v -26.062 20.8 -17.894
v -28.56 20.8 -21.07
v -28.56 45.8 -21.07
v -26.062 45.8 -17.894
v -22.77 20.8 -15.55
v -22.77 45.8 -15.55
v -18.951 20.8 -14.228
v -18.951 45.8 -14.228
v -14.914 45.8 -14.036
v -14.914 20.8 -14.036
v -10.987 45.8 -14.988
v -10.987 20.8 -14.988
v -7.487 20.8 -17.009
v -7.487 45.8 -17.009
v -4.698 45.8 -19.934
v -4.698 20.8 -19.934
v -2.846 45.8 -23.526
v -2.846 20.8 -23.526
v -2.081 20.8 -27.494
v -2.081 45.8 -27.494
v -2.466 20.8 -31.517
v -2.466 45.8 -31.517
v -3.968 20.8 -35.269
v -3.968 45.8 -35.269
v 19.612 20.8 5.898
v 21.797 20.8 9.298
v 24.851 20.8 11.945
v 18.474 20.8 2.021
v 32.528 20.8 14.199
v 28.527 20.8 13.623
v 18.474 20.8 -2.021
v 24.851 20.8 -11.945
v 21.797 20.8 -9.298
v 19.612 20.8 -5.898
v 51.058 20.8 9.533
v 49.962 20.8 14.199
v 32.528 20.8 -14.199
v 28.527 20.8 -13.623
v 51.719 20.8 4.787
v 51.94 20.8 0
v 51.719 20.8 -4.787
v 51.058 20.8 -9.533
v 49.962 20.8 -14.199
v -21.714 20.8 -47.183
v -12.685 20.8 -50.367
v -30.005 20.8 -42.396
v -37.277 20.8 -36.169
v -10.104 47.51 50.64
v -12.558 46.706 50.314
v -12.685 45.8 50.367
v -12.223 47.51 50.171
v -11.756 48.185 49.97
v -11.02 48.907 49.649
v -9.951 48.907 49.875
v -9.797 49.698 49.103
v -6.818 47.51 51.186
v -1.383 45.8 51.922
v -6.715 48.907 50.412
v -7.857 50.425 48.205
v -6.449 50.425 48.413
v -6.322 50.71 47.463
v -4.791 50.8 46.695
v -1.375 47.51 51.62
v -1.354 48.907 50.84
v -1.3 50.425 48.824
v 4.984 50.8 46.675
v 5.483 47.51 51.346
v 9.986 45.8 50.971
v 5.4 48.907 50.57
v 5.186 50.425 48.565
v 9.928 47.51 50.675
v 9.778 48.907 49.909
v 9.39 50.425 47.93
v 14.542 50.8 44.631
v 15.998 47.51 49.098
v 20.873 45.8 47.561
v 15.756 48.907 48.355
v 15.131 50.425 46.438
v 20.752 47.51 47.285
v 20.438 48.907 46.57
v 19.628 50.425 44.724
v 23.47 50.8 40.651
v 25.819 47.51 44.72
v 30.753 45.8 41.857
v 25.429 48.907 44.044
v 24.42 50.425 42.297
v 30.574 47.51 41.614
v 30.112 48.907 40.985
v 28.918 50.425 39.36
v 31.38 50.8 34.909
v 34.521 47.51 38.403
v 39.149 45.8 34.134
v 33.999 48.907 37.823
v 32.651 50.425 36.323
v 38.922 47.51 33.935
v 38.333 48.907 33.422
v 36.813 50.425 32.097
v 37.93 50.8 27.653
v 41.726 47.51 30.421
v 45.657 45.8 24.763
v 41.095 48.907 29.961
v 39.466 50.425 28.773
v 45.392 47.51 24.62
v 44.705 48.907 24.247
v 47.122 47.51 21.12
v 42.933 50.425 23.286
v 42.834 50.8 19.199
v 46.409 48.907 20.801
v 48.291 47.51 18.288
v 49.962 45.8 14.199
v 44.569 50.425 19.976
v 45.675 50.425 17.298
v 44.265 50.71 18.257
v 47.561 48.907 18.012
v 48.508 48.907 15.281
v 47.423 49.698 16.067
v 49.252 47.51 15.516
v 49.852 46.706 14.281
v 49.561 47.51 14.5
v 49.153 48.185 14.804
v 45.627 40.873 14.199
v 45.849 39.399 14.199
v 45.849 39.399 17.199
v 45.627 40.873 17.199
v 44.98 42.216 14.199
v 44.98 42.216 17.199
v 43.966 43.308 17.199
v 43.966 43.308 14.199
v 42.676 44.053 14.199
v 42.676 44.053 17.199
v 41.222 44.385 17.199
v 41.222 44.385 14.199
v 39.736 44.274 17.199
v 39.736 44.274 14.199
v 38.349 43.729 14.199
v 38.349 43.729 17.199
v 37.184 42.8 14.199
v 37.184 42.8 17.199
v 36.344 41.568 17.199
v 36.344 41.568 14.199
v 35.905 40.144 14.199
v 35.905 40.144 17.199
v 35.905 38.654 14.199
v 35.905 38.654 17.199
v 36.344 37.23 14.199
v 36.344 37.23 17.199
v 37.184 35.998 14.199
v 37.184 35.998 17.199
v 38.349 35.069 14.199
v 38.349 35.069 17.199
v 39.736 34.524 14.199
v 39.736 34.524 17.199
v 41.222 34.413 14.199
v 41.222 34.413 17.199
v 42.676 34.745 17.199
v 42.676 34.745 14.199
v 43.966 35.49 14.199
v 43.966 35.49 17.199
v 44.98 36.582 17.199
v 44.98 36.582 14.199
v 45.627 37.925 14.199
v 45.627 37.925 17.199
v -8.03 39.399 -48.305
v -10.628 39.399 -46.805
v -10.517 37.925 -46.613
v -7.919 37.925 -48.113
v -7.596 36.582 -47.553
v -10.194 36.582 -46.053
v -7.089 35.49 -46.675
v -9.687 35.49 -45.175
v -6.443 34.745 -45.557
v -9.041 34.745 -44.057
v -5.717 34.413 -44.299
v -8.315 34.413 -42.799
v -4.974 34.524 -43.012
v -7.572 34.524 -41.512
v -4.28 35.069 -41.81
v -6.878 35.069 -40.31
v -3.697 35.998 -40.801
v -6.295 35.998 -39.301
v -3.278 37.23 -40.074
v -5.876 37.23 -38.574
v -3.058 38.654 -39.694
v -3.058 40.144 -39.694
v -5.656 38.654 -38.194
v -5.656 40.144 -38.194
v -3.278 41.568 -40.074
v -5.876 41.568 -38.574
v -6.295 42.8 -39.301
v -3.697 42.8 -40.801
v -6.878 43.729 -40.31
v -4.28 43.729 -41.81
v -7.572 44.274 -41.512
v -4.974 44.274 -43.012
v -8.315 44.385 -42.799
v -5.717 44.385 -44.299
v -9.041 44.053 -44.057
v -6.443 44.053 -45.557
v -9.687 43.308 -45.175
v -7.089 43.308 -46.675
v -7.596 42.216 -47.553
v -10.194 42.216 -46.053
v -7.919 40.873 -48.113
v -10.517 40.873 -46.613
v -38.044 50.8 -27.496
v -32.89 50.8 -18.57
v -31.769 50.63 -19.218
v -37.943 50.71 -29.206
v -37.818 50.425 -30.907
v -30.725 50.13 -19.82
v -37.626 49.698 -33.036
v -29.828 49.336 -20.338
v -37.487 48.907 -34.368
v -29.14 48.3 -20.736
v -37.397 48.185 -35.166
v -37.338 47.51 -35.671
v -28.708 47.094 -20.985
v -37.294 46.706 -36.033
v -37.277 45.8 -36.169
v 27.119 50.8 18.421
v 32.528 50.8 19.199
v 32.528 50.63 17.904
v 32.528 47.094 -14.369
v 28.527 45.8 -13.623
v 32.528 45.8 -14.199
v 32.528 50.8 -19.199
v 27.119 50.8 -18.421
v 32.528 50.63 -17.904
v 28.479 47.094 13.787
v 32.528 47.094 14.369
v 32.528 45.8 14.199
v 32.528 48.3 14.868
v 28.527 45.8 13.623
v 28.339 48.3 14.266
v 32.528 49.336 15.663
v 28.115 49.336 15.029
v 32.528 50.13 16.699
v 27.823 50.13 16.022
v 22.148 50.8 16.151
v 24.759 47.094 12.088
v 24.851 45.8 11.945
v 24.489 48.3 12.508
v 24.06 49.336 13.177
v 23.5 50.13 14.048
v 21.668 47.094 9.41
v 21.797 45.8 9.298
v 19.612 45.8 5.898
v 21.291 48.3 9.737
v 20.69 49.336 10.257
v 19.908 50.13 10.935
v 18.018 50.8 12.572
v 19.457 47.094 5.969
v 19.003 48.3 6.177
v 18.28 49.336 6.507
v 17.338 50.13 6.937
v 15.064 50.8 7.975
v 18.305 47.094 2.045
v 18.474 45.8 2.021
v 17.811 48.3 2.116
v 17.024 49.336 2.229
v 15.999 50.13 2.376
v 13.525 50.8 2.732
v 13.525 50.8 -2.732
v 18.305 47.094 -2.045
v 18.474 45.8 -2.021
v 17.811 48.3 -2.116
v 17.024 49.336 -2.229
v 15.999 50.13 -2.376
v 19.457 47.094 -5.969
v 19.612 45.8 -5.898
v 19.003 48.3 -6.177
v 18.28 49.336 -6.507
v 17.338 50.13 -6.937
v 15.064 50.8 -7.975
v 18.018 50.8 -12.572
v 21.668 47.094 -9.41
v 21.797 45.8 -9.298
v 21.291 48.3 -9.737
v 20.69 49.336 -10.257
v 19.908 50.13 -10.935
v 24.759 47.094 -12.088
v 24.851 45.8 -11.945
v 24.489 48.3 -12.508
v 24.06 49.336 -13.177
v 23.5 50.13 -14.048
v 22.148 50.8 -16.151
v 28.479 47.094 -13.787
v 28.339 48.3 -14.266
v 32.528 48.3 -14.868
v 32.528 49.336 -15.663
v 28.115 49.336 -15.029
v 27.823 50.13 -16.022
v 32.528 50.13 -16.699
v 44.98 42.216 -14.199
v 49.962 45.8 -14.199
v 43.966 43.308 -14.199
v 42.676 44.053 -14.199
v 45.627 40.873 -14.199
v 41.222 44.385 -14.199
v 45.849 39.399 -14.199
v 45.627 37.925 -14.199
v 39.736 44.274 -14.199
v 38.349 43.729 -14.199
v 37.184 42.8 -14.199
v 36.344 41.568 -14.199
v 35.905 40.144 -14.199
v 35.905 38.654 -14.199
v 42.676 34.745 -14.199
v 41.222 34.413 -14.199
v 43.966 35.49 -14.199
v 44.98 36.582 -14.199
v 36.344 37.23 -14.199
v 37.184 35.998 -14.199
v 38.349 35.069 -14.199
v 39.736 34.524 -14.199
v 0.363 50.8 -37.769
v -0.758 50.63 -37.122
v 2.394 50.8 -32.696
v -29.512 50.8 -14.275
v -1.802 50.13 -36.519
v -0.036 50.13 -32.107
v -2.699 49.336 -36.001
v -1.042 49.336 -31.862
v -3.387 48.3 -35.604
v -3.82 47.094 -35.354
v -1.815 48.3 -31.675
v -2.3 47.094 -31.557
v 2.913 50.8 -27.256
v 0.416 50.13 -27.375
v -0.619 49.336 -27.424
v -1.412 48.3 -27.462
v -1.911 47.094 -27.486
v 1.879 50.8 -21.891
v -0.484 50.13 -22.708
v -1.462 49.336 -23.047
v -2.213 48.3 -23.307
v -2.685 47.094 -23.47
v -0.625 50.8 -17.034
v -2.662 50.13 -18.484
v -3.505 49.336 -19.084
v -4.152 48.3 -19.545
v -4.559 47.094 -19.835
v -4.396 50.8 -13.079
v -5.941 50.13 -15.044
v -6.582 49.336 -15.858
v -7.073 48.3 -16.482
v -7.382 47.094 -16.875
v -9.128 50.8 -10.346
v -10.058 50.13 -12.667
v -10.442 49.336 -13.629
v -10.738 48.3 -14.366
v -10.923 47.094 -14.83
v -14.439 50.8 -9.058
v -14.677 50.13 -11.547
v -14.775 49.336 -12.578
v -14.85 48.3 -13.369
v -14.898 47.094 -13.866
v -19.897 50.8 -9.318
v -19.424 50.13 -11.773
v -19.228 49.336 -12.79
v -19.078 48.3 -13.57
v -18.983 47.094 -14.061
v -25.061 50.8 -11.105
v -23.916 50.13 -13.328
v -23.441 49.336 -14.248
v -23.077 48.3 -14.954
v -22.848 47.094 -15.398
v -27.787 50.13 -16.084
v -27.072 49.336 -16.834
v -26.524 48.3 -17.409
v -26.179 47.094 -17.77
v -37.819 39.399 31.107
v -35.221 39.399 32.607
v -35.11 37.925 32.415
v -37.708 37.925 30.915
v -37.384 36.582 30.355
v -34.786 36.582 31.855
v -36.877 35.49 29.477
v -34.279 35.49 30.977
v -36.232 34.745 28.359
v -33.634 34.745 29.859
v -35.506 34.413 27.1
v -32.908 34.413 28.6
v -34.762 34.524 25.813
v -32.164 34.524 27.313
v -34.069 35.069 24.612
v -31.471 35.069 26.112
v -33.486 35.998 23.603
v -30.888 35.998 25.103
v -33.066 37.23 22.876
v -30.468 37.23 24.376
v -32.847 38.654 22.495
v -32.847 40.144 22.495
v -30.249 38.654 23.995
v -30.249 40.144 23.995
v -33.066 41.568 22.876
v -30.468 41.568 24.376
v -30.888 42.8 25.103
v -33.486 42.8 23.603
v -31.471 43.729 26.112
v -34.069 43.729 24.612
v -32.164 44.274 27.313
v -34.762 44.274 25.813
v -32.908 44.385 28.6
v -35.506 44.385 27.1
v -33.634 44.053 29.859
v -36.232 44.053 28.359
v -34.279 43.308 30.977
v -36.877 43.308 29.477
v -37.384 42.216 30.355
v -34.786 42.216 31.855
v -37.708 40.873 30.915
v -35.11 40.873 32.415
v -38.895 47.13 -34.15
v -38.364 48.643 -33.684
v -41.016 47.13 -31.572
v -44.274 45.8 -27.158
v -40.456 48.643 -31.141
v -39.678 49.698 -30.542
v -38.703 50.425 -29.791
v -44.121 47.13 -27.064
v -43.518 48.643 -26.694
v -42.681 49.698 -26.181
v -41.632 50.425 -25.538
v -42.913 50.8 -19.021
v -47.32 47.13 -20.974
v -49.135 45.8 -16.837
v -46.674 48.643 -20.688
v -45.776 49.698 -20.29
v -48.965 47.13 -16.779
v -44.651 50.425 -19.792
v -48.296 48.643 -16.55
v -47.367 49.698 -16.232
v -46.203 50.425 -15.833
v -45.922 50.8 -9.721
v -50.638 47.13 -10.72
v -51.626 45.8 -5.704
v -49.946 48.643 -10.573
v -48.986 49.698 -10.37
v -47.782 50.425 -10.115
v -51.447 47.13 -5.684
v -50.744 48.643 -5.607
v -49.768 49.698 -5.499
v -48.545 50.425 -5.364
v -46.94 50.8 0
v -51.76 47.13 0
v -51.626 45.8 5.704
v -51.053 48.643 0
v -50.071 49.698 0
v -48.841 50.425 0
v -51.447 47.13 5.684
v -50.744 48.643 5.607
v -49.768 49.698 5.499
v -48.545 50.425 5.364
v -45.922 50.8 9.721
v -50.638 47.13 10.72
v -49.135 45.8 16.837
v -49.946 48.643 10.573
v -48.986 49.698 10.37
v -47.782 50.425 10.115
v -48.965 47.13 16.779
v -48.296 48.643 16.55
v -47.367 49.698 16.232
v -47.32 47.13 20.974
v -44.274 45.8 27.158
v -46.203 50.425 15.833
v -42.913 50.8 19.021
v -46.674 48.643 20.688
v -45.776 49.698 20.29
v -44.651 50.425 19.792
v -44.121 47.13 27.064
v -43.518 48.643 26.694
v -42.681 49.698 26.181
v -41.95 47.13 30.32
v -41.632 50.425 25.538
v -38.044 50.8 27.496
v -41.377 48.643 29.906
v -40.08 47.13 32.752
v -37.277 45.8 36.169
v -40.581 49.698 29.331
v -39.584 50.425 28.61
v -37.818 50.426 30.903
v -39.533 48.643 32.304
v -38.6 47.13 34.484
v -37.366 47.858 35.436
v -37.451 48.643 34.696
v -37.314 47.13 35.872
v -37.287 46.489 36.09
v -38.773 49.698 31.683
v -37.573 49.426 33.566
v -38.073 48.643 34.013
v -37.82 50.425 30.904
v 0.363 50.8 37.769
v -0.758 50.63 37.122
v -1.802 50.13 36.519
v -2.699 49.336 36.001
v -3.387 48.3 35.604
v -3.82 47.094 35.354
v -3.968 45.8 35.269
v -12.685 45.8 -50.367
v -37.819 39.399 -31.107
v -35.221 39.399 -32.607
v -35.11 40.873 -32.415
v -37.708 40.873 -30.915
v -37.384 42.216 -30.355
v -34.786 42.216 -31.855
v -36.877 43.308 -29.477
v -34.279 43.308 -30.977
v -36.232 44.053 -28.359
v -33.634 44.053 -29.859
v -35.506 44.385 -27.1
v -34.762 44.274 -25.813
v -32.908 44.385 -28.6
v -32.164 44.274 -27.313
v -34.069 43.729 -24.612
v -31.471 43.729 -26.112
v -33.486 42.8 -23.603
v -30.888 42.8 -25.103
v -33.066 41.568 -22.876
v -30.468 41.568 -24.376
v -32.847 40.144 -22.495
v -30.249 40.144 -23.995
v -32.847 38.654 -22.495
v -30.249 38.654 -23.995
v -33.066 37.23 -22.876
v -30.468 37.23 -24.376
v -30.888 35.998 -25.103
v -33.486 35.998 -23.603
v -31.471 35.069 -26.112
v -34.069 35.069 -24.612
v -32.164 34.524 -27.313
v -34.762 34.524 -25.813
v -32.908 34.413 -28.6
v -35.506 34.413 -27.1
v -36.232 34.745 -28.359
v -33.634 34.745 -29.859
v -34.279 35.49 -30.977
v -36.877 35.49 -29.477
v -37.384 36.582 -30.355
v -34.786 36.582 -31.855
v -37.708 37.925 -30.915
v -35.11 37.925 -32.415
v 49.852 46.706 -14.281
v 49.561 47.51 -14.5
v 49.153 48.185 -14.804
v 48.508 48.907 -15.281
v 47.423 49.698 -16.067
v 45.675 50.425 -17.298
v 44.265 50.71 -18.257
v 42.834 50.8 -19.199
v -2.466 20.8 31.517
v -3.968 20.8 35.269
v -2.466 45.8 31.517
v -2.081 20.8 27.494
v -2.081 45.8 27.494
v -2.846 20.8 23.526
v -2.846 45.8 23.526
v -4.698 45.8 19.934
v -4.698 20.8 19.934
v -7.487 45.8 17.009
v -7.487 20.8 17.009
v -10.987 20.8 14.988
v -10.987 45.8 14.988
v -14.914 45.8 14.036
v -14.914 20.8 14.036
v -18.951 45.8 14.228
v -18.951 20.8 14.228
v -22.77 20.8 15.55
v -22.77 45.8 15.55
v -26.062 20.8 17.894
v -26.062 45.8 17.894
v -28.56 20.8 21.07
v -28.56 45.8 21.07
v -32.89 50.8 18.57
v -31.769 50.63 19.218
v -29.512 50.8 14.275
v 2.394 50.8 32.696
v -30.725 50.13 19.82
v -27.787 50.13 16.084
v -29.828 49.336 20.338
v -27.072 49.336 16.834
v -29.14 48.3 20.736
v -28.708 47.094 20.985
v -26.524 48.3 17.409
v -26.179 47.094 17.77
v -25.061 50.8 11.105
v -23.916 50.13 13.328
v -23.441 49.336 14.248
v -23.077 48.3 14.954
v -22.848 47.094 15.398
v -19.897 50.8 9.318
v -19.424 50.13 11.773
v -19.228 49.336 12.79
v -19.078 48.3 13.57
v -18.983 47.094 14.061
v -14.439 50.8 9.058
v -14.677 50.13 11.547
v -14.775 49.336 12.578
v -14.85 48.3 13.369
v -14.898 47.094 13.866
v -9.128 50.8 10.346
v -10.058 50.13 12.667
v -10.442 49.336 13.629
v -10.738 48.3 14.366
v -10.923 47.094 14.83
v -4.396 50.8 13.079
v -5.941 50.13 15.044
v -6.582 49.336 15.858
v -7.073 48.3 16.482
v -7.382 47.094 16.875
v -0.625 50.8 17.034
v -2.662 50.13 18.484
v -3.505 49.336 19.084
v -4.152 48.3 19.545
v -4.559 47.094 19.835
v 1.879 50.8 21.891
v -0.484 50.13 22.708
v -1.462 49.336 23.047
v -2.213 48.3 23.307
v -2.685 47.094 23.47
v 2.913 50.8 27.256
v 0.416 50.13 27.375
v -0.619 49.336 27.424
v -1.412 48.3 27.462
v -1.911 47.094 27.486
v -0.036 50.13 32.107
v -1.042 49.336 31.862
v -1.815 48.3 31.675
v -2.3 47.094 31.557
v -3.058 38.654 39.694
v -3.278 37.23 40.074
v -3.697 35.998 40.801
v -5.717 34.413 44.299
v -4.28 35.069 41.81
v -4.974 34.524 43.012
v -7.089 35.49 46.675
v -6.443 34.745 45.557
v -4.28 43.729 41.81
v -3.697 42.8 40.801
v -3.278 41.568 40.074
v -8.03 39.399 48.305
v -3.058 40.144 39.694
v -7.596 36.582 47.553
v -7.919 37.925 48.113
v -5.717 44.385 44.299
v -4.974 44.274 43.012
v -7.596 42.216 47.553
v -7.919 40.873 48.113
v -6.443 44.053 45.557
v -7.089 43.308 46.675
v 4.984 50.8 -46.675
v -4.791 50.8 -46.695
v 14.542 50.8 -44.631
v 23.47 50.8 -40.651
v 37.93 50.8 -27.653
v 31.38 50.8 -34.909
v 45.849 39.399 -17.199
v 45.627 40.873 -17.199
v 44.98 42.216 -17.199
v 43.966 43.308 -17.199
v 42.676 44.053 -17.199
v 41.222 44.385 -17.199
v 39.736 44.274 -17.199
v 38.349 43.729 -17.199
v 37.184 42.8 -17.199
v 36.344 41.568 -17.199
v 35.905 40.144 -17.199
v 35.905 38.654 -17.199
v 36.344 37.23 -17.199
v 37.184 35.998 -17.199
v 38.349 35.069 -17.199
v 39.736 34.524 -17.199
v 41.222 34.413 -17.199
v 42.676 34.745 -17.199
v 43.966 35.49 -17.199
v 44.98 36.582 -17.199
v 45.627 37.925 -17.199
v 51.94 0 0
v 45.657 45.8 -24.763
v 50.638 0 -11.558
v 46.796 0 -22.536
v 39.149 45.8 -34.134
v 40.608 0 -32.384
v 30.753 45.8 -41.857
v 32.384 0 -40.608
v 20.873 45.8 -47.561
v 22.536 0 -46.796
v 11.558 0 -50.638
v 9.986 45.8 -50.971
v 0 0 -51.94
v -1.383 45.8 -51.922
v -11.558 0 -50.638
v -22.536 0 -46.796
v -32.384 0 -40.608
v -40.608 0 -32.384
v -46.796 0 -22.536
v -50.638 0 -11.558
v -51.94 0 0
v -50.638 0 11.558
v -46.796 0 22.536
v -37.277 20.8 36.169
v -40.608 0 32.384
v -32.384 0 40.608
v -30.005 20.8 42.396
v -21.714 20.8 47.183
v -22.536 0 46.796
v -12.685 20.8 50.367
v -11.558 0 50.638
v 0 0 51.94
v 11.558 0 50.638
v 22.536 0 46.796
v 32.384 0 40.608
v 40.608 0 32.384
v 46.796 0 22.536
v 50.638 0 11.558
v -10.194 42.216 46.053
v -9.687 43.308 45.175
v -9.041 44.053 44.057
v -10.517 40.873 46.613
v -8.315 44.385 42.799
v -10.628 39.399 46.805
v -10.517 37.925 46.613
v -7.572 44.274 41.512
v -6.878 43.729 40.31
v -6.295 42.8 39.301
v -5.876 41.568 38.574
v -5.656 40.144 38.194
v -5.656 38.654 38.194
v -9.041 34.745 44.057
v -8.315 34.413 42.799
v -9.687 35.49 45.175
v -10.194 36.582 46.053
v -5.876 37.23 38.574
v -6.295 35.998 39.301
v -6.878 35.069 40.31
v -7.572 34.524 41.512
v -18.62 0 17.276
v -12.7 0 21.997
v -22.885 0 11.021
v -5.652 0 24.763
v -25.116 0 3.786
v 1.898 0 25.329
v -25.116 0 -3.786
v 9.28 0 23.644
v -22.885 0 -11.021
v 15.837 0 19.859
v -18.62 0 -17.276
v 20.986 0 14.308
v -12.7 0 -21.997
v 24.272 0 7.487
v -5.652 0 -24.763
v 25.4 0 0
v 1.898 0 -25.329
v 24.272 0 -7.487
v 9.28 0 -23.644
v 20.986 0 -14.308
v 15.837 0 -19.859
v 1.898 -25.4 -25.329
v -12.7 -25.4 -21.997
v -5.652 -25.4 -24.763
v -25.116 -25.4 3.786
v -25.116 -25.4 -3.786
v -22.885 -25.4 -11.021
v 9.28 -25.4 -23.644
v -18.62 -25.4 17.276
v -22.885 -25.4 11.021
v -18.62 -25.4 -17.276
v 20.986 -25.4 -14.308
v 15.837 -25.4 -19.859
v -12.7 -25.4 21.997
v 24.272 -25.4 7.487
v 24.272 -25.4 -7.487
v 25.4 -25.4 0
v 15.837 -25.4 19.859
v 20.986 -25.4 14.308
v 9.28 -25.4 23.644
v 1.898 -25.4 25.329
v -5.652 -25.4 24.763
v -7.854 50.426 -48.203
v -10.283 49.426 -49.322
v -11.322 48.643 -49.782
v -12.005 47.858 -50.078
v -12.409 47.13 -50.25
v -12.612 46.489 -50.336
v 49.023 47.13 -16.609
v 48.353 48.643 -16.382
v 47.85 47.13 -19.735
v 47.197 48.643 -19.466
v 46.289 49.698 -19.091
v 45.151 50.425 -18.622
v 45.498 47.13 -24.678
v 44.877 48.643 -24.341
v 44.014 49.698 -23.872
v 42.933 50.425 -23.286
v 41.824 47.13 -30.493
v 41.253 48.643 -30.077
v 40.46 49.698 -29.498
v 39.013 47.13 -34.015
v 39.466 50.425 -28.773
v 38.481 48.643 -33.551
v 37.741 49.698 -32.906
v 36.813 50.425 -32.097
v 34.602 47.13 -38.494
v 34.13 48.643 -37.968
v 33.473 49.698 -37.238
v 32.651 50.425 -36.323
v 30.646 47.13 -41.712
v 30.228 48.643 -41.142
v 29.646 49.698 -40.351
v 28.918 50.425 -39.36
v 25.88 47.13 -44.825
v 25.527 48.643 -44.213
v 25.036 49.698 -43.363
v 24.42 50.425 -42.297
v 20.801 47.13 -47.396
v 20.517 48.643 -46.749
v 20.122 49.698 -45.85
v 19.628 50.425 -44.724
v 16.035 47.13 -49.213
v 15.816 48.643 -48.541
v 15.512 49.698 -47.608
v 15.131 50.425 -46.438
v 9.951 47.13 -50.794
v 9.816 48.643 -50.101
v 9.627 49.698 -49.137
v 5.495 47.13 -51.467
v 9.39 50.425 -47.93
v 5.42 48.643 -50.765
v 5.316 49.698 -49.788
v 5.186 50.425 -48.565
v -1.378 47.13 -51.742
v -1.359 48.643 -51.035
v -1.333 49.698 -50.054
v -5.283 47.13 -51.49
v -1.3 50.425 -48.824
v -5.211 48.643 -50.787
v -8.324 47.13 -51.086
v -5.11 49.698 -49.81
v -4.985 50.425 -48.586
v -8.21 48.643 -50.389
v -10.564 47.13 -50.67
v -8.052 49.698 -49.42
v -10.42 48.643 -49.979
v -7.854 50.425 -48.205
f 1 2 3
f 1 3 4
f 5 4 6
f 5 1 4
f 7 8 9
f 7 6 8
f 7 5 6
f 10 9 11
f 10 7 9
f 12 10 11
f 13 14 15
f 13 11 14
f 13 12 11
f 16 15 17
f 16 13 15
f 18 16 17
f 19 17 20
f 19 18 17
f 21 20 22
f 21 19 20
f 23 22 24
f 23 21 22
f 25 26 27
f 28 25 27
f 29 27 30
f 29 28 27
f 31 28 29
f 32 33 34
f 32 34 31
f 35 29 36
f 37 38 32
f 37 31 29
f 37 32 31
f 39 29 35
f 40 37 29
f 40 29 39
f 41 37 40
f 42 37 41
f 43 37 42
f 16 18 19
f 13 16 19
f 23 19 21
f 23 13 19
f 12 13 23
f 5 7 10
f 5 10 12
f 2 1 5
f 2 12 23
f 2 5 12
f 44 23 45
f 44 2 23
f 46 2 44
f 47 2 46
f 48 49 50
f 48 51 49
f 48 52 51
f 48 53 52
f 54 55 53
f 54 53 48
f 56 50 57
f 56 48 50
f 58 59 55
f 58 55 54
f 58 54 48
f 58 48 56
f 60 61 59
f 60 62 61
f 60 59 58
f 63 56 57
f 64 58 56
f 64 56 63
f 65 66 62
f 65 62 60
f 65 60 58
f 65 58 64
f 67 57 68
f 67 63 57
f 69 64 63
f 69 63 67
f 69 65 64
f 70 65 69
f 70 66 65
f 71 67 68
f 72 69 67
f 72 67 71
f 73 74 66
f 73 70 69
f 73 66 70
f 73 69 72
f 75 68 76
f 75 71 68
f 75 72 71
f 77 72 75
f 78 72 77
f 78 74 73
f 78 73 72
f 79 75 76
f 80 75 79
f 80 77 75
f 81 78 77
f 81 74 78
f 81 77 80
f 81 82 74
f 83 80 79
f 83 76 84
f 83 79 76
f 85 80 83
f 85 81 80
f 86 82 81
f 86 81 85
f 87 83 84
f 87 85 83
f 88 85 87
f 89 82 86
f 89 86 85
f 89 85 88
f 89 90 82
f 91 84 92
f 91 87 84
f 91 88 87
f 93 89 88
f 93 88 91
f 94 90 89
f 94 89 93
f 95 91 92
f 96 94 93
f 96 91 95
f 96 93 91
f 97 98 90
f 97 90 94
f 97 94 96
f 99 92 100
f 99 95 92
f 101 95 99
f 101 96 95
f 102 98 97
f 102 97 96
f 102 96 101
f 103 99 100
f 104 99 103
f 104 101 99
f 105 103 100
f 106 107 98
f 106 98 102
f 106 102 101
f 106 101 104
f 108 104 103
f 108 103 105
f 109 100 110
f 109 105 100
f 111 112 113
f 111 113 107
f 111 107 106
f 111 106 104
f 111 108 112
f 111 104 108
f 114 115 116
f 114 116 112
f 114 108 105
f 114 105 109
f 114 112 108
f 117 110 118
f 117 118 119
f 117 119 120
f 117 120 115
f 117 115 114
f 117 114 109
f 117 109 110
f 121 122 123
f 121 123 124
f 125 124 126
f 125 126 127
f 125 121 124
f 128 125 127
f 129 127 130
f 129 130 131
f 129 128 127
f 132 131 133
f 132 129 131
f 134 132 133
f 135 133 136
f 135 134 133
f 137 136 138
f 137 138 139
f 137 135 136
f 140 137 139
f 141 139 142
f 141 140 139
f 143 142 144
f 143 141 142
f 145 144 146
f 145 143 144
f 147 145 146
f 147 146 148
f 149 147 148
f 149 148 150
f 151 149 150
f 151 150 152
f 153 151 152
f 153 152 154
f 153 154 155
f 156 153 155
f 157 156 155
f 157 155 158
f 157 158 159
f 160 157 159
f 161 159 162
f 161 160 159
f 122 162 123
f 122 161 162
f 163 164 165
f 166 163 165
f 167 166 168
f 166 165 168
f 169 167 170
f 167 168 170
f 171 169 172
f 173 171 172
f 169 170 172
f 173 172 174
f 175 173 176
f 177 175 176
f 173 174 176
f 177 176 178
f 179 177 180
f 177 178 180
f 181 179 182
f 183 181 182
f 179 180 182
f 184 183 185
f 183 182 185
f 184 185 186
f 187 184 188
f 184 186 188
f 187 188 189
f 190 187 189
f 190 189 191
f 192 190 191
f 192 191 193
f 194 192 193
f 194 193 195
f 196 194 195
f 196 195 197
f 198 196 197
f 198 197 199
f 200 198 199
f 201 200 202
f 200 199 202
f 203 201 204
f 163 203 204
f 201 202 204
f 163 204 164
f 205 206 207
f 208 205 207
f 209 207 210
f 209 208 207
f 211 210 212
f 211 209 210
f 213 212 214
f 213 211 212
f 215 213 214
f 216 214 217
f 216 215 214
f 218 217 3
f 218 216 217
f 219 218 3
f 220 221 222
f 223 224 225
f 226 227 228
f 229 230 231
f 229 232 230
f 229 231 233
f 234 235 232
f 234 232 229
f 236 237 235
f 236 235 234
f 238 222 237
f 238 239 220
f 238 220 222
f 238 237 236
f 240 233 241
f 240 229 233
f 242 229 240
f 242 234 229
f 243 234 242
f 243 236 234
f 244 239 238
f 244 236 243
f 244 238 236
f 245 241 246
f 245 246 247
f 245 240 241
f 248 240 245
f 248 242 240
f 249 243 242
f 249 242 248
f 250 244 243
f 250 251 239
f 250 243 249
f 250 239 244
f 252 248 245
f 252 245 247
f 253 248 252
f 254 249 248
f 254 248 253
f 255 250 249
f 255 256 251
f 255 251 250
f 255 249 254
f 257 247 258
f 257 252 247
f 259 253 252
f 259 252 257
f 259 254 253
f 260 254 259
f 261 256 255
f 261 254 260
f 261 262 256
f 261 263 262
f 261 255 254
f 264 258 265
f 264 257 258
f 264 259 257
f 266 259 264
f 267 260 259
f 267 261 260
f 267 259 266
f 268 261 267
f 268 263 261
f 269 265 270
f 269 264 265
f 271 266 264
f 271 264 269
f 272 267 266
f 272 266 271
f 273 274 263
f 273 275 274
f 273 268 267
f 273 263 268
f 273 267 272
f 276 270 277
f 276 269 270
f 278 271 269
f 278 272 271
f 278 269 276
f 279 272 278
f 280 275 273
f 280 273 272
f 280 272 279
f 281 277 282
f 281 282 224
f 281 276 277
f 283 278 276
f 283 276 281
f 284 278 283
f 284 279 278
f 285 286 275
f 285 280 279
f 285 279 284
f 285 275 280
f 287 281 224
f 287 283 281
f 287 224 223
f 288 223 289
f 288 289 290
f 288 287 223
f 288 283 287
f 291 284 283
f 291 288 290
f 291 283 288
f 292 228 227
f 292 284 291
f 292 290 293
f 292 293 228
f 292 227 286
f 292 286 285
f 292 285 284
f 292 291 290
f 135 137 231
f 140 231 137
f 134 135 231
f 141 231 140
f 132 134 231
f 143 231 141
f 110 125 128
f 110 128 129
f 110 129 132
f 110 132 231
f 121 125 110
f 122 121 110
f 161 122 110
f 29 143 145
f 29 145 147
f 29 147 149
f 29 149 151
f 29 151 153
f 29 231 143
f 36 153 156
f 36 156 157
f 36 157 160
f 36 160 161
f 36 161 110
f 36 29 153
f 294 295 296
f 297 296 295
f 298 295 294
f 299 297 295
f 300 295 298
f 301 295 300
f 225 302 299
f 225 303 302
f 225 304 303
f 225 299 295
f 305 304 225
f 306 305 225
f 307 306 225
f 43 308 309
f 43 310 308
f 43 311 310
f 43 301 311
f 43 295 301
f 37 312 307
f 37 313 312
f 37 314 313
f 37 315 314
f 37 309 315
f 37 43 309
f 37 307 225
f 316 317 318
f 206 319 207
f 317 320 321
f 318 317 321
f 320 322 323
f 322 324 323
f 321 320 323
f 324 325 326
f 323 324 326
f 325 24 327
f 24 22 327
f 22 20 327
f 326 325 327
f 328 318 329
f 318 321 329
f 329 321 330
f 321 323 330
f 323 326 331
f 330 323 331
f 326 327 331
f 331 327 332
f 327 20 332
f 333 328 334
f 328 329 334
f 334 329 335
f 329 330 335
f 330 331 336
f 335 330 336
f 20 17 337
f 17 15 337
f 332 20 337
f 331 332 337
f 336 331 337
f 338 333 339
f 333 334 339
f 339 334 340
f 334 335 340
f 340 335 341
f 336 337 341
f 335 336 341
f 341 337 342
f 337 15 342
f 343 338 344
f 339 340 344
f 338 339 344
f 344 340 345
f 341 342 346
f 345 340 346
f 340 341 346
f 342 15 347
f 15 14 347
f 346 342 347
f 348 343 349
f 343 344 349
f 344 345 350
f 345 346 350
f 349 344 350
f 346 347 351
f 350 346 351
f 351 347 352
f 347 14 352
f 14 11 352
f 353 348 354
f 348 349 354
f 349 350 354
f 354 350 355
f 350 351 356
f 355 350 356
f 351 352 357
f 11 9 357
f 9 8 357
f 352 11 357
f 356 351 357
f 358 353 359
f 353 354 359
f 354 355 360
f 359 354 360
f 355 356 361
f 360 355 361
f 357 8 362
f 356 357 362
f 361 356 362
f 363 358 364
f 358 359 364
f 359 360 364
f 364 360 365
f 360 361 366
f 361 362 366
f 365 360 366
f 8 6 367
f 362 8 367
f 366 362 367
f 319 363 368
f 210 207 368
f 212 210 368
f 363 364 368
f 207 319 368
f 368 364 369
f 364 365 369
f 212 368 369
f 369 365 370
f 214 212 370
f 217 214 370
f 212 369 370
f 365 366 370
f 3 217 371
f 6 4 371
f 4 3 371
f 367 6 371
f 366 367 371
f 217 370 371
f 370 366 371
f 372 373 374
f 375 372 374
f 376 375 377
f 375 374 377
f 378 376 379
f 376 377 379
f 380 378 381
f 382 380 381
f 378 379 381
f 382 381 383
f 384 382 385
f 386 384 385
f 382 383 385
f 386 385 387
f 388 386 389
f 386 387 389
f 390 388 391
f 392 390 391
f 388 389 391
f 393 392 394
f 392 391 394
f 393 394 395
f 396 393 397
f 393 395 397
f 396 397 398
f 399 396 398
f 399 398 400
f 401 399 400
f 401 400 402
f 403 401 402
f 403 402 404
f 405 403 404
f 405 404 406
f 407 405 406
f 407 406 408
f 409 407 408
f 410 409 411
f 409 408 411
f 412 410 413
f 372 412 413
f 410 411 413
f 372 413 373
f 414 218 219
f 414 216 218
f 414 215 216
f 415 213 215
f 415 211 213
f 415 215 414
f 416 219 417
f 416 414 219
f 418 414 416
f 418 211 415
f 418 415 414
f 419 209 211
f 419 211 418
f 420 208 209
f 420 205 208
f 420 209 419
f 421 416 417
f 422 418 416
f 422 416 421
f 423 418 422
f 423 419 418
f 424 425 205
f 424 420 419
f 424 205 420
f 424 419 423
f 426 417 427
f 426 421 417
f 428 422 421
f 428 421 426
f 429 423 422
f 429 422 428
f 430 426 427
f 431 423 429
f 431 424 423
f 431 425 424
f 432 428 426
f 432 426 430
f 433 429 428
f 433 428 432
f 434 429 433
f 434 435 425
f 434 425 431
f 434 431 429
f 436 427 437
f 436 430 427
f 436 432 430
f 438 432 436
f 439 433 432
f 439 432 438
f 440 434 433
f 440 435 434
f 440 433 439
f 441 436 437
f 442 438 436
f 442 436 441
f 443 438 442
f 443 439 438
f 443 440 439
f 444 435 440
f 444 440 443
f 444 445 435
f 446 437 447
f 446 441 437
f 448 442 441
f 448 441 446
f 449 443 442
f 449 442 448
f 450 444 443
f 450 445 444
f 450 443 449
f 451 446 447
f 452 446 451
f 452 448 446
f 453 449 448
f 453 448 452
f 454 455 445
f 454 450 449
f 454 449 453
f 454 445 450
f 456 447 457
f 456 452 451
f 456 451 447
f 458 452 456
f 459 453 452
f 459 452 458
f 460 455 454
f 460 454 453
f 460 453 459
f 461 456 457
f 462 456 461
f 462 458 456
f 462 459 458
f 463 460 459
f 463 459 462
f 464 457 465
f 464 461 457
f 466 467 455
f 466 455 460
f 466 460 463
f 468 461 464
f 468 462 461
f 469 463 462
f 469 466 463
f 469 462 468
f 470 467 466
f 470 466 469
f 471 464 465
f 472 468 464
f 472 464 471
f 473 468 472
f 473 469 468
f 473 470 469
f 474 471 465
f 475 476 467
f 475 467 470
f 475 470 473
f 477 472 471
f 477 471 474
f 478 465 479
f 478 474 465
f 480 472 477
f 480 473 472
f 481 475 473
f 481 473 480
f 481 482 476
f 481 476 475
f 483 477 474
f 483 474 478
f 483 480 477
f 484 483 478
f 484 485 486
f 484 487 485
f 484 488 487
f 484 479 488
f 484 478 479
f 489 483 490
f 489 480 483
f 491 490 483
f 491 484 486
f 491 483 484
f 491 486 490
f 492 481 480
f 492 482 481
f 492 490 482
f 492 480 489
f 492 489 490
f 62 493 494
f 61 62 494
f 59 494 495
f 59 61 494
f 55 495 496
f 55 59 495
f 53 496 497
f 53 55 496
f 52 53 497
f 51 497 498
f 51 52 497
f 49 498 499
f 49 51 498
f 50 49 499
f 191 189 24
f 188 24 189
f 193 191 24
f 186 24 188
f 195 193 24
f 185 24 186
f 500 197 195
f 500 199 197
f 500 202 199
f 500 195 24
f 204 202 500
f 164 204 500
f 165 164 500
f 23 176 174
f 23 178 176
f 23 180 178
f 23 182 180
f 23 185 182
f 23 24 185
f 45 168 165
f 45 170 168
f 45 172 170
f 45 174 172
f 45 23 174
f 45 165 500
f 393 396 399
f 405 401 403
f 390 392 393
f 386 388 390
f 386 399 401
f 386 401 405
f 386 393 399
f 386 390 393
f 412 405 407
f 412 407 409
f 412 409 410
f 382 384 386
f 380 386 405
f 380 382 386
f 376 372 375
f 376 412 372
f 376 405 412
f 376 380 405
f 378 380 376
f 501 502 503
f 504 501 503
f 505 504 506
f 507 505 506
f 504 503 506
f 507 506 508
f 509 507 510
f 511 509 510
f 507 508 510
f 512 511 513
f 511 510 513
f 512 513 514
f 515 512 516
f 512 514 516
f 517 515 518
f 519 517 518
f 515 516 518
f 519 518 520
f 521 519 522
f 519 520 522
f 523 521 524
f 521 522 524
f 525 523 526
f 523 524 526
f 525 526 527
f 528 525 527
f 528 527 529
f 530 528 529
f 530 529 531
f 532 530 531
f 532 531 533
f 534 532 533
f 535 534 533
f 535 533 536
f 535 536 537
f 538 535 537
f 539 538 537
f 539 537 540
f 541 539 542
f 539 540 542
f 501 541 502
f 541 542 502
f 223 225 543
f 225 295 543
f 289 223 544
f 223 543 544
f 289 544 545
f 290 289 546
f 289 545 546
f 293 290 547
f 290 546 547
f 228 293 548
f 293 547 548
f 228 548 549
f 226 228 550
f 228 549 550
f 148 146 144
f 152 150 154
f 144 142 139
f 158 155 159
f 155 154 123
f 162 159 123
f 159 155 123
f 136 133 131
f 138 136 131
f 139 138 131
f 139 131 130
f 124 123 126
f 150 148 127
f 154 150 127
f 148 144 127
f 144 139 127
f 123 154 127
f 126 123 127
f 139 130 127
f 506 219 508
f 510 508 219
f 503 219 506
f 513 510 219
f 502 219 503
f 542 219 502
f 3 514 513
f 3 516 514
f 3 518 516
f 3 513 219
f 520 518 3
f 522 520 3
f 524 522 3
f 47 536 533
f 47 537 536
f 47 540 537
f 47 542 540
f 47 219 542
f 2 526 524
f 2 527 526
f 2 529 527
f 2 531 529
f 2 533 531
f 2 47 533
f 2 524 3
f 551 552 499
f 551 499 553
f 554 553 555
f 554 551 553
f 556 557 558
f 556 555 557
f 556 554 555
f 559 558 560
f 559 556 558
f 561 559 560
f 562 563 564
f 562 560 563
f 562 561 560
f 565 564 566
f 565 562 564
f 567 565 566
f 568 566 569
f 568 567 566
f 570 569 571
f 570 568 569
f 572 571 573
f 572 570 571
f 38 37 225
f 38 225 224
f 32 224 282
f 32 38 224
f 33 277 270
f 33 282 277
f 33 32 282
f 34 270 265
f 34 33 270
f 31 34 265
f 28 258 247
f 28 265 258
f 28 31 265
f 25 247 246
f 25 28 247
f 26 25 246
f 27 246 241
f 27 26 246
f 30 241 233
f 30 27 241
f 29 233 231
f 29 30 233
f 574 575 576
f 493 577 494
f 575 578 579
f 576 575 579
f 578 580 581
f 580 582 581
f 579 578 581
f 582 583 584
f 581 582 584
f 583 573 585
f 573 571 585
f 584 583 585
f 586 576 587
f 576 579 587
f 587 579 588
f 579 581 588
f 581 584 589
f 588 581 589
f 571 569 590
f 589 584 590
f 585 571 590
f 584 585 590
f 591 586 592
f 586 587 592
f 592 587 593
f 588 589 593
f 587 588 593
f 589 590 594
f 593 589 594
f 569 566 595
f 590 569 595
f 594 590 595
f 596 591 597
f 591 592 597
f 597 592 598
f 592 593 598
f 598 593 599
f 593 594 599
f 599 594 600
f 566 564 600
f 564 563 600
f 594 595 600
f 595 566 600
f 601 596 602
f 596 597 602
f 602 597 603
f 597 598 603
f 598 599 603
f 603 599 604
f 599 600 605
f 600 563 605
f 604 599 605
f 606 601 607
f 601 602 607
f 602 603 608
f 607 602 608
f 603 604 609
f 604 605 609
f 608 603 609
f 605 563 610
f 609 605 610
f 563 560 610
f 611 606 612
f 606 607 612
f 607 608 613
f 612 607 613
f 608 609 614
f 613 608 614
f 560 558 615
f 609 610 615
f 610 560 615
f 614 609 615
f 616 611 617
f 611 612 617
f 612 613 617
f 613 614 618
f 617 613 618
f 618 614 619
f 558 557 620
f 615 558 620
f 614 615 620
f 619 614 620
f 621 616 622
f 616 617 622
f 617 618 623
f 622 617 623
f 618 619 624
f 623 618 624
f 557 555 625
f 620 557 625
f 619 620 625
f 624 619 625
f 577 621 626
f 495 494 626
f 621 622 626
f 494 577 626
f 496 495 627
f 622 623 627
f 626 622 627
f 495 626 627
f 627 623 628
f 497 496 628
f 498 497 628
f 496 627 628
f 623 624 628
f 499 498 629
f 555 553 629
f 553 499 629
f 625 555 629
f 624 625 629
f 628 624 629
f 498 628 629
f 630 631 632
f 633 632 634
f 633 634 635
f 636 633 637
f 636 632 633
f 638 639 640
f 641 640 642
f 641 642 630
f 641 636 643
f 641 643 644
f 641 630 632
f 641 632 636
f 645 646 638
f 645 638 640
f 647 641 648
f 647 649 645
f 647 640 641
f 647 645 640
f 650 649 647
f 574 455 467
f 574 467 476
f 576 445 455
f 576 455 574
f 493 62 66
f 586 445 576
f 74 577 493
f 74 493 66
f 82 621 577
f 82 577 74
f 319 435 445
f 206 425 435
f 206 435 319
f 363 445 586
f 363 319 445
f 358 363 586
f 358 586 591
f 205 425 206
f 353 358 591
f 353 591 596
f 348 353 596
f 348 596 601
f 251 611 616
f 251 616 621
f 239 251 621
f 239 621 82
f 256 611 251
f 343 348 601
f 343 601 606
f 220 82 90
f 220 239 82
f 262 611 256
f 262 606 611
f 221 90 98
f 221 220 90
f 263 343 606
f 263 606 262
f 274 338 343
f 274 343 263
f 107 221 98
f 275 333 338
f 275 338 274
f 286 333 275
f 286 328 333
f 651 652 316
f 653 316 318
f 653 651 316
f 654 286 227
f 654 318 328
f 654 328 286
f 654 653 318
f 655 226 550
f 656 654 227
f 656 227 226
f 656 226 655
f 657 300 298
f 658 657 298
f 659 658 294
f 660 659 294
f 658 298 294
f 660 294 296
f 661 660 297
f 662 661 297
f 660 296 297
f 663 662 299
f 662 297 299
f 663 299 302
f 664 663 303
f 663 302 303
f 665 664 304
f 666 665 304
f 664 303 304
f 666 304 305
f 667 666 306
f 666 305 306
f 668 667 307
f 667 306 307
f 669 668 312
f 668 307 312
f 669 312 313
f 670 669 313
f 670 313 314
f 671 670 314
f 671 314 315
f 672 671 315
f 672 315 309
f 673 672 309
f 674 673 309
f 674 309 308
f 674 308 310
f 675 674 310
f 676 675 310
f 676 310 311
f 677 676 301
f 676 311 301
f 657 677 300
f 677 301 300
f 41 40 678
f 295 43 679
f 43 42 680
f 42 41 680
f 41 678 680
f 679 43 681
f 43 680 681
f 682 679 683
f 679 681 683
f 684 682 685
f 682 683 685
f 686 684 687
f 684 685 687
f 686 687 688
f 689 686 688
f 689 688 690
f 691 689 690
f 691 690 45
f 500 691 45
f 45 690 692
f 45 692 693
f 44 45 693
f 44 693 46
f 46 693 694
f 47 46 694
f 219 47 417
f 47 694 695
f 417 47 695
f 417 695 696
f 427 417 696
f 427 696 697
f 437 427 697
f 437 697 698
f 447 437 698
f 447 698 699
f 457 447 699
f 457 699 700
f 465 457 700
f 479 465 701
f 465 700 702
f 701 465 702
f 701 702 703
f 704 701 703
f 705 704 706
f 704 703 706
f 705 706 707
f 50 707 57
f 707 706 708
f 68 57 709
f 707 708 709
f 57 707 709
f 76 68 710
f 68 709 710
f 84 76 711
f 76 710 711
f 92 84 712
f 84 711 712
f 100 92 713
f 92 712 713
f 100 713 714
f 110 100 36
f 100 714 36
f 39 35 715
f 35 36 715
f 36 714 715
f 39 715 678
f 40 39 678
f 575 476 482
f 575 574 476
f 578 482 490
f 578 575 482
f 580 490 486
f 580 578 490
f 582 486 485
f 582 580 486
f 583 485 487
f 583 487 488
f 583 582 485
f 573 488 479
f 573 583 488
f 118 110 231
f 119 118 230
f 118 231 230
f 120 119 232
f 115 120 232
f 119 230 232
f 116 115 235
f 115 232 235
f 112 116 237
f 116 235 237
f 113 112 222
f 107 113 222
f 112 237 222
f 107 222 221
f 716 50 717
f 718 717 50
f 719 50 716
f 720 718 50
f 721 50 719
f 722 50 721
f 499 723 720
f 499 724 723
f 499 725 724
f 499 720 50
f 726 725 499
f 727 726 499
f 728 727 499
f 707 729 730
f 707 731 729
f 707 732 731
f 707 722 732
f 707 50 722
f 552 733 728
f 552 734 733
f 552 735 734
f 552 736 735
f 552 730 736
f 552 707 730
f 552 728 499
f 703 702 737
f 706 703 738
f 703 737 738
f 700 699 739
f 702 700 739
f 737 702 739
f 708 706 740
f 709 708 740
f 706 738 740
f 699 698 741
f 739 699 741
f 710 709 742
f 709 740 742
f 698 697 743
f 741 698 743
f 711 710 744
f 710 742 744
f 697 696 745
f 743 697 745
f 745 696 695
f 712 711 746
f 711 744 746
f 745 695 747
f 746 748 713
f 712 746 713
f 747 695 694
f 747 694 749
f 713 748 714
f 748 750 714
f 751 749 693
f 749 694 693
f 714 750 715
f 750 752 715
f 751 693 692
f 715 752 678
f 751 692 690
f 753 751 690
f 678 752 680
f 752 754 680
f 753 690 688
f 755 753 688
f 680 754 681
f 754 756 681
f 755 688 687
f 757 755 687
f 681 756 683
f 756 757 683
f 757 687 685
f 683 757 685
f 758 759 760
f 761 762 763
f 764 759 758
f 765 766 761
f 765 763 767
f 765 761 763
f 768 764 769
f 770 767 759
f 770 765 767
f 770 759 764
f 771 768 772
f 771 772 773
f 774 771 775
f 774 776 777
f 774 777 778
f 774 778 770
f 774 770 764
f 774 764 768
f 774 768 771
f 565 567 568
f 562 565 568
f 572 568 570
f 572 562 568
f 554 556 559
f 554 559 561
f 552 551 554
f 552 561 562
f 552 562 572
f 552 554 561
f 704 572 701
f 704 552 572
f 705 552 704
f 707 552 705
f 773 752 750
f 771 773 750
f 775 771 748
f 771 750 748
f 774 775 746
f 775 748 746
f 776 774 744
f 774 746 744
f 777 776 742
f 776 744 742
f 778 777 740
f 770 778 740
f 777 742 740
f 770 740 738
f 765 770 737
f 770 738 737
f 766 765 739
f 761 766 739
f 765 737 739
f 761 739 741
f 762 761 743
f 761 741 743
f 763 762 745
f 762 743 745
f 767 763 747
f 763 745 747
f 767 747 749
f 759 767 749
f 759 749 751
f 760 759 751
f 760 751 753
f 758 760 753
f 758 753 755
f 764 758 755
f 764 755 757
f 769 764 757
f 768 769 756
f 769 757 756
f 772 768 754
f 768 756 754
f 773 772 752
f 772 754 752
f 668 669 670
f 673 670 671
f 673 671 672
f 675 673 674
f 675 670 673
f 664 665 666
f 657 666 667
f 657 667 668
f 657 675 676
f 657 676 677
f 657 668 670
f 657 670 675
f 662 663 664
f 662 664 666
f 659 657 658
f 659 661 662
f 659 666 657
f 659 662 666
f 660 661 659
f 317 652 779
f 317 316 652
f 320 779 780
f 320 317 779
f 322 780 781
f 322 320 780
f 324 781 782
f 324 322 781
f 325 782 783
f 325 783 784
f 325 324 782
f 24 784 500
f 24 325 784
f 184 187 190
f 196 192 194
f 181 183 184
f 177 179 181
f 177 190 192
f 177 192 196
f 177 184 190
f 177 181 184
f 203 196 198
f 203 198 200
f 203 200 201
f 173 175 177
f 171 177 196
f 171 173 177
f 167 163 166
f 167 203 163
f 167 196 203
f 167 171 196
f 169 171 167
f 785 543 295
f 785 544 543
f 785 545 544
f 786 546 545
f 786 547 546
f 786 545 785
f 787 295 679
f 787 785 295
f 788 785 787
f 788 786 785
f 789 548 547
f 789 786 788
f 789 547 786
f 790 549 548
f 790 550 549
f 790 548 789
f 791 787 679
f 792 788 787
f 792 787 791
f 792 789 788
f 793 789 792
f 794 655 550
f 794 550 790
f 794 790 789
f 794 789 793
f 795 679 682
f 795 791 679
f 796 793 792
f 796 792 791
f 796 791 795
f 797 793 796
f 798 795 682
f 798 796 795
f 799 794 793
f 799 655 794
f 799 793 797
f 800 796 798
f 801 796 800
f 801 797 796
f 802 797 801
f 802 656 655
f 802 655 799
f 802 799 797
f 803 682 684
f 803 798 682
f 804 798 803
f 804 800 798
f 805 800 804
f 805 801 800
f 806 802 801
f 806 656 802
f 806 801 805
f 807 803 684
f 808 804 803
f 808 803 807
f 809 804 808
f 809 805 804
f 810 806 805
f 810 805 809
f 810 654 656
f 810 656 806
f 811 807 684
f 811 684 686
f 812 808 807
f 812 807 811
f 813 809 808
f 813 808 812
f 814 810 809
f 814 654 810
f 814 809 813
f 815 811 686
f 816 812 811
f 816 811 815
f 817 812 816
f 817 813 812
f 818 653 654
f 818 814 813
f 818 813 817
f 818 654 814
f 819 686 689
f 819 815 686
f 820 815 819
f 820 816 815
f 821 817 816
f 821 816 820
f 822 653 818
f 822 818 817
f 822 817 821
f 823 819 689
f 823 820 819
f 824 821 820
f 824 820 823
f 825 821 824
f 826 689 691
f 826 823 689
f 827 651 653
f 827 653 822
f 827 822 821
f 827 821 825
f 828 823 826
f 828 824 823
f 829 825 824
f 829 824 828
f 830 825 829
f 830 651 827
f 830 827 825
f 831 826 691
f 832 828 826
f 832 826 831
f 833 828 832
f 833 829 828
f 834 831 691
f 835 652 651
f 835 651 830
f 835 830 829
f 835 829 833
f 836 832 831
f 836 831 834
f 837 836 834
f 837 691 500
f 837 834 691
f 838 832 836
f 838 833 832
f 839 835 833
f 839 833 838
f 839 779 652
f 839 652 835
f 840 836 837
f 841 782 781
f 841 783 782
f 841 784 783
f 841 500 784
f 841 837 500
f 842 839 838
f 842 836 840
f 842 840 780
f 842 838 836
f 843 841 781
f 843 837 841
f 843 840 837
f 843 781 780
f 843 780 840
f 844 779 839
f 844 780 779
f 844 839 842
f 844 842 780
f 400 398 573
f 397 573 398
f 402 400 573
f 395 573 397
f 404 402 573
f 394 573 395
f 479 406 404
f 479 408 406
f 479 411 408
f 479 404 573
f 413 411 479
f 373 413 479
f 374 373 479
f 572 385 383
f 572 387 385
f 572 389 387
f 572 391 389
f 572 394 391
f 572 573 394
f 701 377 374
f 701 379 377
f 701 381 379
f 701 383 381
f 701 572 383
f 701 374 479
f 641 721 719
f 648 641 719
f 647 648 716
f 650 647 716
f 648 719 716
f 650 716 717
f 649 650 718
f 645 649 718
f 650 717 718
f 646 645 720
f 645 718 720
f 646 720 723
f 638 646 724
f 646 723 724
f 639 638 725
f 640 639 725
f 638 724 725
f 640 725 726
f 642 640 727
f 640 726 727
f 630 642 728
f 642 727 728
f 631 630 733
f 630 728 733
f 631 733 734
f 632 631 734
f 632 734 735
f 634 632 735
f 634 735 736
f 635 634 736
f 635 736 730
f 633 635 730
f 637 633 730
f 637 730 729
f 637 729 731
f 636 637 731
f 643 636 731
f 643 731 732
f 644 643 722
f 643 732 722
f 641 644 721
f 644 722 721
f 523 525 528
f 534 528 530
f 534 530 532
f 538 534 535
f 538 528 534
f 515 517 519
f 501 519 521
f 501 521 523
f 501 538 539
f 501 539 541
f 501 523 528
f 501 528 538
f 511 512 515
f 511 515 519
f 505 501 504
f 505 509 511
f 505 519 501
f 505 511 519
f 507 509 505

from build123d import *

# Parameters (mm, degrees)
SKETCH1_R                   = 51.94
BOSS_EXTRUDE1_DEPTH         = 50.8
CUT_EXTRUDE1_START          = -30
CUT_EXTRUDE1_DEPTH          = 31
SKETCH3_R                   = 5
CUT_EXTRUDE2_DEPTH          = 3
CIRPATTERN1_COUNT           = 3
CIRPATTERN1_COPY_1_SKETCH_R = 5
CIRPATTERN1_COPY_1_DEPTH    = 3
CIRPATTERN1_COPY_2_SKETCH_R = 5
CIRPATTERN1_COPY_2_DEPTH    = 3
FILLET2_R                   = 5
SKETCH6_R                   = 25.4
BOSS_EXTRUDE2_DEPTH         = 25.4


with BuildPart() as part:
    # Sketch1 → Boss-Extrude1 (new body)
    with BuildSketch(Plane(origin=(0, 0, 0), x_dir=(1, 0, 0), z_dir=(0, 1, 0))):
        Circle(SKETCH1_R)
    extrude(amount=BOSS_EXTRUDE1_DEPTH)

    # Sketch2 → Cut-Extrude1 (cut)
    with BuildSketch(Plane(origin=(0, 50.8, 0), x_dir=(1, 0, 0), z_dir=(0, 1, 0)).offset(CUT_EXTRUDE1_START)):
        with BuildLine():
            Line((302.928702249, 14.198513891), (49.96164332, 14.198513891))
            Line((49.96164332, 14.198513891), (32.527604999, 14.198513891))
            ThreePointArc((32.527604999, 14.198513891), (18.329091108, 0), (32.527604999, -14.198513891))
            Line((32.527604999, -14.198513891), (49.96164332, -14.198513891))
            Line((49.96164332, -14.198513891), (302.928702249, -14.198513891))
            Line((302.928702249, -14.198513891), (808.862820107, -14.198513891))
            Line((808.862820107, -14.198513891), (808.862820107, 14.198513891))
            Line((808.862820107, 14.198513891), (302.928702249, 14.198513891))
        make_face()
    cut_extrude1 = extrude(amount=CUT_EXTRUDE1_DEPTH, mode=Mode.SUBTRACT)

    # Sketch3 → Cut-Extrude2 (cut)
    with BuildSketch(Plane.XY.offset(-14.198513891)):
        with Locations((40.848803203, 39.398991639)):
            Circle(SKETCH3_R)
    cut_extrude2 = extrude(amount=-CUT_EXTRUDE2_DEPTH, mode=Mode.SUBTRACT)

    # Mirror1: Cut-Extrude2 across plane
    add(cut_extrude2.mirror(Plane.XY), mode=Mode.SUBTRACT)

    # CirPattern1: Cut-Extrude1, Cut-Extrude2 ×3 about axis
    cirpattern1_axis = Axis((0, 0, 0), (0, 1, 0))
    for i in range(1, CIRPATTERN1_COUNT):
        add(cut_extrude1.rotate(cirpattern1_axis, i * 360 / CIRPATTERN1_COUNT), mode=Mode.SUBTRACT)
        add(cut_extrude2.rotate(cirpattern1_axis, i * 360 / CIRPATTERN1_COUNT), mode=Mode.SUBTRACT)

    # CirPattern1 copy 1 sketch → CirPattern1 copy 1 (cut)
    with BuildSketch(Plane(origin=(12.296273726, 0, -7.099256946), x_dir=(-0.5, 0, -0.866025404), z_dir=(-0.866025404, 0, 0.5))):
        with Locations((40.848803203, -39.398991639)):
            Circle(CIRPATTERN1_COPY_1_SKETCH_R)
    extrude(amount=-CIRPATTERN1_COPY_1_DEPTH, mode=Mode.SUBTRACT)

    # CirPattern1 copy 2 sketch → CirPattern1 copy 2 (cut)
    with BuildSketch(Plane(origin=(-12.296273726, 0, -7.099256946), x_dir=(-0.5, 0, 0.866025404), z_dir=(0.866025404, 0, 0.5))):
        with Locations((40.848803203, -39.398991639)):
            Circle(CIRPATTERN1_COPY_2_SKETCH_R)
    extrude(amount=-CIRPATTERN1_COPY_2_DEPTH, mode=Mode.SUBTRACT)

    # Fillet2
    fillet2_edges = [part.edges().sort_by_distance(p)[0] for p in [
        (25.97, 50.8, 44.981359473),
        (-8.326038354, 50.8, 42.818149238),
        (-9.164545554, 50.8, 15.873458528),
        (-32.918585806, 50.8, 28.619635346),
        (-51.94, 50.8, 0),
        (-32.918585806, 50.8, -28.619635346),
        (-9.164545554, 50.8, -15.873458528),
        (-8.326038354, 50.8, -42.818149238),
        (25.97, 50.8, -44.981359473),
        (41.24462416, 50.8, 14.198513891),
        (18.329091108, 50.8, 0),
        (41.24462416, 50.8, -14.198513891),
    ]]
    fillet(fillet2_edges, radius=FILLET2_R)

    # Sketch6 → Boss-Extrude2 (add)
    with BuildSketch(Plane.XZ):
        Circle(SKETCH6_R)
    extrude(amount=BOSS_EXTRUDE2_DEPTH)


solid = part.part
